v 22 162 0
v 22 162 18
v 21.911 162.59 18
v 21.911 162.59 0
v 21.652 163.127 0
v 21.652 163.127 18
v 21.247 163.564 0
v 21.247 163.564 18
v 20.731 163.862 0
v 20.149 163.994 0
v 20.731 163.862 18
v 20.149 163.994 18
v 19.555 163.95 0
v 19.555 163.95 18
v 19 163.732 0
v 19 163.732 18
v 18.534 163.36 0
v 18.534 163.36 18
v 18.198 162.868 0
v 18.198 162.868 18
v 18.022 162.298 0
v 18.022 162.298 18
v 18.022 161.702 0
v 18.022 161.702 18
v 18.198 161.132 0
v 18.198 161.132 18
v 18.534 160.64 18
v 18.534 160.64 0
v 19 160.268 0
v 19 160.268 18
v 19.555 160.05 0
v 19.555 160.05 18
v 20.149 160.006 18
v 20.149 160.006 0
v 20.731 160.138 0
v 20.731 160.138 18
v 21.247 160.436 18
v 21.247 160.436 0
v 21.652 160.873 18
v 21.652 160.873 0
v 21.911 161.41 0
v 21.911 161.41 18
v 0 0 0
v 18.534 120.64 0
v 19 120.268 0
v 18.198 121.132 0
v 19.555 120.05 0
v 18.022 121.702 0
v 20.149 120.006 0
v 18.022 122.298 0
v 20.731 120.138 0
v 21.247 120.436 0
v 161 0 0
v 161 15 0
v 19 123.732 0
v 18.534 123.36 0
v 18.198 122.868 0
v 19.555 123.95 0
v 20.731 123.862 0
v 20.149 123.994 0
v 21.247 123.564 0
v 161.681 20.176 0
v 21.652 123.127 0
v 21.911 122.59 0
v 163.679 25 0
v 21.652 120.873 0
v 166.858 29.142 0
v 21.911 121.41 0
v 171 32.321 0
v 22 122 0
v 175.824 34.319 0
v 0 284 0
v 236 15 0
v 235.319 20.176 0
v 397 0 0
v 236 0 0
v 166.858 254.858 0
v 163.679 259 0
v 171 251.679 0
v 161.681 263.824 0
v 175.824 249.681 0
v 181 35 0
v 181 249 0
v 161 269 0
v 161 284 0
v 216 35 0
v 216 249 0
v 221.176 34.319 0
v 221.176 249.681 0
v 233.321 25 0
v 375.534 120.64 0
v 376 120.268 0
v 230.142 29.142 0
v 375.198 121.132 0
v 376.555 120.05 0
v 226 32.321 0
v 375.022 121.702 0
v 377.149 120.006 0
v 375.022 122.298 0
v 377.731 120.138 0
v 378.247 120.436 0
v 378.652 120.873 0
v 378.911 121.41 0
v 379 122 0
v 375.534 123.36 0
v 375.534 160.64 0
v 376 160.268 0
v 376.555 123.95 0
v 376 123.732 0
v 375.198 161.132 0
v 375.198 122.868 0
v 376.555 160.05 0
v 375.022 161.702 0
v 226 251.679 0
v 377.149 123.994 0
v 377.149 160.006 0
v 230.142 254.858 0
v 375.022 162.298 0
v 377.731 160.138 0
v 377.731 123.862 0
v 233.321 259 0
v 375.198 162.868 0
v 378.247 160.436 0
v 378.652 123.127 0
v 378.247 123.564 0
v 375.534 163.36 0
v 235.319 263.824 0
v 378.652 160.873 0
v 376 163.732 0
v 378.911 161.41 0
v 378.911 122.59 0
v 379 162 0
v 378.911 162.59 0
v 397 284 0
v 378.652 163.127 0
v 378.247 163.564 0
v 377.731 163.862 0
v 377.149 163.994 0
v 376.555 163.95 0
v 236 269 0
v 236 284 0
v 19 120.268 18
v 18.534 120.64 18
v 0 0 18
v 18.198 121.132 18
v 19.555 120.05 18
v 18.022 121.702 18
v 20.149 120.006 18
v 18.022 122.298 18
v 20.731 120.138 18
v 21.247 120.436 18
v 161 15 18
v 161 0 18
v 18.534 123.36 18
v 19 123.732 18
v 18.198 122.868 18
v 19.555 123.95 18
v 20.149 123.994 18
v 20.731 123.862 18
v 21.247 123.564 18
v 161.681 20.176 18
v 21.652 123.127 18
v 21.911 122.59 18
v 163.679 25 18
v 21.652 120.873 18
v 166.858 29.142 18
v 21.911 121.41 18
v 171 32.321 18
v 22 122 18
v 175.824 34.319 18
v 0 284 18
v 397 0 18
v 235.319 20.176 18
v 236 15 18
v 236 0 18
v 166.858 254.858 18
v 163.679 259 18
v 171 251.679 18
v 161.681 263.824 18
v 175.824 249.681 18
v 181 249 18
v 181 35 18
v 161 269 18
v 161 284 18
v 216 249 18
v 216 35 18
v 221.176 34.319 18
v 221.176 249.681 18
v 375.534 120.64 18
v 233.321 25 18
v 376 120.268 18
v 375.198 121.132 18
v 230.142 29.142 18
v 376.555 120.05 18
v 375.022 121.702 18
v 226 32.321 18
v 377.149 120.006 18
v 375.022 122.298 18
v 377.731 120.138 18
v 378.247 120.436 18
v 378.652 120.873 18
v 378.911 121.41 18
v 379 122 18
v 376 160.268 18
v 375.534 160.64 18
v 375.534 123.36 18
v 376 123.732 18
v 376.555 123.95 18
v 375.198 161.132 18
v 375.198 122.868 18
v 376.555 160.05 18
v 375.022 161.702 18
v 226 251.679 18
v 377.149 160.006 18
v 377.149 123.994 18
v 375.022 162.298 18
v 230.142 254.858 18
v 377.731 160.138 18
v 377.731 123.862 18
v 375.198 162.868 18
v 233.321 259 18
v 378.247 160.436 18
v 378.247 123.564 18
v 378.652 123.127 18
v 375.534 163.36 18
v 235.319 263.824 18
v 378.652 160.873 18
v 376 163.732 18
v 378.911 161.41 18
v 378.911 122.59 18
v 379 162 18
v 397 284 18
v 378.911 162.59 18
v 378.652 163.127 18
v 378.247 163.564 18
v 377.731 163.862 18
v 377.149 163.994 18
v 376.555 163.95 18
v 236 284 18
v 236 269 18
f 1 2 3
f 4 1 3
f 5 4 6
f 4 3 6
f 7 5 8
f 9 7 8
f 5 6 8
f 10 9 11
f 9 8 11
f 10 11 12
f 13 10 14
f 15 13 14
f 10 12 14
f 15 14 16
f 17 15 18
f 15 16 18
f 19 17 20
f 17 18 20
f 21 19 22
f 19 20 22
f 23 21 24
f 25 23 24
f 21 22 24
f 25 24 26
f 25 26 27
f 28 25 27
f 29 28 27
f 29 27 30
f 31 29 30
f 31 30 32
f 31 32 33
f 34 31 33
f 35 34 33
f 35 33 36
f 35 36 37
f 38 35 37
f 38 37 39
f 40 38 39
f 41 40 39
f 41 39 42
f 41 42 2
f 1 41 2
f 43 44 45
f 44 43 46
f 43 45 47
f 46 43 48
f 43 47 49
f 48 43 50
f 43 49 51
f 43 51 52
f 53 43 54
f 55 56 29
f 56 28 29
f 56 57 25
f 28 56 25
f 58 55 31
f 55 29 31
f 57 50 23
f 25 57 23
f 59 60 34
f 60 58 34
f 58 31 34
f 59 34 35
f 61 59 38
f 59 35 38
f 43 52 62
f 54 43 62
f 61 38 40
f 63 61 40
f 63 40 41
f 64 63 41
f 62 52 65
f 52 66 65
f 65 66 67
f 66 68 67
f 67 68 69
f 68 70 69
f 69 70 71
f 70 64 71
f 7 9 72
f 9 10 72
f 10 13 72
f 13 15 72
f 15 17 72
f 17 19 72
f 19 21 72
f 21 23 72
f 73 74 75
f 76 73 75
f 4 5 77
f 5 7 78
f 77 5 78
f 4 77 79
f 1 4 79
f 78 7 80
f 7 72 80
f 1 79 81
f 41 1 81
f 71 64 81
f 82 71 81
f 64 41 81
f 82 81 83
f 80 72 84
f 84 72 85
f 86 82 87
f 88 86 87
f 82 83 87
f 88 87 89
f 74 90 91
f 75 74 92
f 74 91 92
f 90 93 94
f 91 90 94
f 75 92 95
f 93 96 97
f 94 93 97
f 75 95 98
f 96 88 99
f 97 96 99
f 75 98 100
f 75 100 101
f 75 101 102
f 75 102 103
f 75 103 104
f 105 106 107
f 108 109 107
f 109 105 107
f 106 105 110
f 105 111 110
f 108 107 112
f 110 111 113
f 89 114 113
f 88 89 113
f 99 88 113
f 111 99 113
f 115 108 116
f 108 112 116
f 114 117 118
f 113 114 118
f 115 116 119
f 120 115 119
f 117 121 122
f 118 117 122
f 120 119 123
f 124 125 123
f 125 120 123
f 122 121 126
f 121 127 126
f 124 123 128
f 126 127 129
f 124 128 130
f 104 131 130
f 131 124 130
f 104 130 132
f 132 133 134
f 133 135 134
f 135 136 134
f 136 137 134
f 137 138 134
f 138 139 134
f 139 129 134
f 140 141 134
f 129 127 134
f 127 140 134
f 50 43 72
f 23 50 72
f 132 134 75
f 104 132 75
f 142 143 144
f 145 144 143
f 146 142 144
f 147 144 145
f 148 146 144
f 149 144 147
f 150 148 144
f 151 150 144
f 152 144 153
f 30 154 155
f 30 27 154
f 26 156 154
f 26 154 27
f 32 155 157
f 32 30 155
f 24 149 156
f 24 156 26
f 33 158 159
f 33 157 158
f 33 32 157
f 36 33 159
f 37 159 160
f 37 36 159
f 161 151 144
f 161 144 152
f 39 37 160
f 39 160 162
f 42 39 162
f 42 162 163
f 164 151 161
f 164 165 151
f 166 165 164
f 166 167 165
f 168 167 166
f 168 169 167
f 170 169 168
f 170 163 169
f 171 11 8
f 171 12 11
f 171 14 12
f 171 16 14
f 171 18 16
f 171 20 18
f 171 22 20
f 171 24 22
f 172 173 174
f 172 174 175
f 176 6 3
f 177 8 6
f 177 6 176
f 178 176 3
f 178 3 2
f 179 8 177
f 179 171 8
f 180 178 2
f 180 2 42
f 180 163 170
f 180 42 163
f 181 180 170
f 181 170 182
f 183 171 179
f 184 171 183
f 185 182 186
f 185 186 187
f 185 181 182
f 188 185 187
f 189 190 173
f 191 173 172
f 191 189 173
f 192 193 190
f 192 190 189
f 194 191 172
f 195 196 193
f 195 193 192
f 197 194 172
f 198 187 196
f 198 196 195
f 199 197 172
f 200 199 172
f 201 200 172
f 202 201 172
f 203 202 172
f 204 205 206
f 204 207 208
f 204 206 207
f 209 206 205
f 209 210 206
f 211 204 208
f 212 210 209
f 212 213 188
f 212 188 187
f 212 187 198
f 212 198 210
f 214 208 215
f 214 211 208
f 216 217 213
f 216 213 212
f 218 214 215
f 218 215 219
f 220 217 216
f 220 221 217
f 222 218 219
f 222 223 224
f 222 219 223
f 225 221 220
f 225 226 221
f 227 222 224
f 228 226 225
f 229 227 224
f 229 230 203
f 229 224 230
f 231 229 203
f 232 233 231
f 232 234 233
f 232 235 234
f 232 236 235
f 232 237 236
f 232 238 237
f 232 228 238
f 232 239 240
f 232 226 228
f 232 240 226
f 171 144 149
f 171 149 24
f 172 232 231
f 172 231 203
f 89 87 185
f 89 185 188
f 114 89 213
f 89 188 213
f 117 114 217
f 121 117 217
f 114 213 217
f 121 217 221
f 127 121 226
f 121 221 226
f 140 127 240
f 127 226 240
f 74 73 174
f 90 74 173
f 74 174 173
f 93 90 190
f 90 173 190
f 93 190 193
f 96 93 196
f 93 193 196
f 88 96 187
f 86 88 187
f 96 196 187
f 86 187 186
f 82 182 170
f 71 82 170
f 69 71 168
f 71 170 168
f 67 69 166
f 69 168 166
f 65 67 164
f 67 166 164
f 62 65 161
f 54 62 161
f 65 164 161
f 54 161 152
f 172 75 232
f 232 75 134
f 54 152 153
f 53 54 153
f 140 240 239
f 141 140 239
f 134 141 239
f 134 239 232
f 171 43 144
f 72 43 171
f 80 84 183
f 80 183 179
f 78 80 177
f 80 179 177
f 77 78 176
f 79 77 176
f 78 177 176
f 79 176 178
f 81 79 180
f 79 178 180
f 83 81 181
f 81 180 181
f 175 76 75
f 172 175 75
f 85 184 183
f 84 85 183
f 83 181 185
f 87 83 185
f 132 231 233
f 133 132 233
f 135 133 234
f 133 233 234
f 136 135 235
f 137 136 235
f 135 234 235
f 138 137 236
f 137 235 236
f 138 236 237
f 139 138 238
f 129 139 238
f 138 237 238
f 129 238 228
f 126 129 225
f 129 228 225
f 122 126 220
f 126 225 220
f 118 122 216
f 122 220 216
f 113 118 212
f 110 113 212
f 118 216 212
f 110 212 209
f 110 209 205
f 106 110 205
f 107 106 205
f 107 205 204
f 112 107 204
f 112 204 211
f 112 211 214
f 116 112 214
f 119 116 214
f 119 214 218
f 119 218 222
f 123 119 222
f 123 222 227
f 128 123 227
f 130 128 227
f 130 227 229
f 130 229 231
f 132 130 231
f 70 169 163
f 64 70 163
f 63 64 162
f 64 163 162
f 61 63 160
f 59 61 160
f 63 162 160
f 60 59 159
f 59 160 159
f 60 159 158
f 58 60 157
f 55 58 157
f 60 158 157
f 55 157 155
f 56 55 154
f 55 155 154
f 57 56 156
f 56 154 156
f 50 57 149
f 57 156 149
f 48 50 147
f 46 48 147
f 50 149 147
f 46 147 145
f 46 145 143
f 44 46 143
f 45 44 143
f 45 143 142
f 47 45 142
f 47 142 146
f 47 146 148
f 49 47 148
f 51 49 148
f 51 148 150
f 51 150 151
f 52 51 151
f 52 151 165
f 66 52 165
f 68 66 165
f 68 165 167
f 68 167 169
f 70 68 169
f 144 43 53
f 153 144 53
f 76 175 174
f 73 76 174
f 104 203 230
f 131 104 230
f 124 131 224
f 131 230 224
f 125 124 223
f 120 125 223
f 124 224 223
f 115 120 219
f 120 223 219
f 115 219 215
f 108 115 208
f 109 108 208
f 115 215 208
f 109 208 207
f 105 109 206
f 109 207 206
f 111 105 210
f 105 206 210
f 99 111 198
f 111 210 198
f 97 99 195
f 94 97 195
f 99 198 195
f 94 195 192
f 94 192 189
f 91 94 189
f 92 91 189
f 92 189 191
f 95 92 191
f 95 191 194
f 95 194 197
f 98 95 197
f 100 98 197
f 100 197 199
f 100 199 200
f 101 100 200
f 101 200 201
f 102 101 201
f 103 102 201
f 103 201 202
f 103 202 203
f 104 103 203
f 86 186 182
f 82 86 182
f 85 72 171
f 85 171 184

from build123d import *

# Parameters (mm, degrees)
SKETCH1_W           = 397
SKETCH1_H           = 284
BOSS_EXTRUDE1_DEPTH = 18
SKETCH2_R           = 2
CUT_EXTRUDE1_DEPTH  = 19


with BuildPart() as part:
    # Sketch1 → Boss-Extrude1 (new body)
    with BuildSketch(Plane.XY):
        with Locations((198.5, 142)):
            Rectangle(SKETCH1_W, SKETCH1_H)
    extrude(amount=BOSS_EXTRUDE1_DEPTH)

    # Sketch2 → Cut-Extrude1 (cut, through all)
    with BuildSketch(Plane.XY.offset(18)):
        with Locations((20, 162)):
            Circle(SKETCH2_R)
        with Locations((20, 122)):
            Circle(SKETCH2_R)
        with Locations((377, 122)):
            Circle(SKETCH2_R)
        with Locations((377, 162)):
            Circle(SKETCH2_R)
        with BuildLine():
            Line((236, 284), (161, 284))
            Line((161, 284), (161, 269))
            ThreePointArc((161, 269), (166.857864376, 254.857864376), (181, 249))
            Line((181, 249), (216, 249))
            ThreePointArc((216, 249), (230.142135624, 254.857864376), (236, 269))
            Line((236, 269), (236, 284))
        make_face()
        with BuildLine():
            Line((216, 35), (181, 35))
            ThreePointArc((181, 35), (166.857864376, 29.142135624), (161, 15))
            Line((161, 15), (161, 0))
            Line((161, 0), (236, 0))
            Line((236, 0), (236, 15))
            ThreePointArc((236, 15), (230.142135624, 29.142135624), (216, 35))
        make_face()
    extrude(amount=-CUT_EXTRUDE1_DEPTH, mode=Mode.SUBTRACT)


solid = part.part
